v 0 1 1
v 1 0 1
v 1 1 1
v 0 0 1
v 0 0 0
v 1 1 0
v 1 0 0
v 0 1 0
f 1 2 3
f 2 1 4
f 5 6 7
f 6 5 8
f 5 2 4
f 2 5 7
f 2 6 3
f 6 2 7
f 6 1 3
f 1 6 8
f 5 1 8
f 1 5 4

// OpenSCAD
minkowski() {
    intersection() {
        translate([-2,0,0]) cube(1);
        translate([2,0,0]) cube(1);
    }
    cube();
}
